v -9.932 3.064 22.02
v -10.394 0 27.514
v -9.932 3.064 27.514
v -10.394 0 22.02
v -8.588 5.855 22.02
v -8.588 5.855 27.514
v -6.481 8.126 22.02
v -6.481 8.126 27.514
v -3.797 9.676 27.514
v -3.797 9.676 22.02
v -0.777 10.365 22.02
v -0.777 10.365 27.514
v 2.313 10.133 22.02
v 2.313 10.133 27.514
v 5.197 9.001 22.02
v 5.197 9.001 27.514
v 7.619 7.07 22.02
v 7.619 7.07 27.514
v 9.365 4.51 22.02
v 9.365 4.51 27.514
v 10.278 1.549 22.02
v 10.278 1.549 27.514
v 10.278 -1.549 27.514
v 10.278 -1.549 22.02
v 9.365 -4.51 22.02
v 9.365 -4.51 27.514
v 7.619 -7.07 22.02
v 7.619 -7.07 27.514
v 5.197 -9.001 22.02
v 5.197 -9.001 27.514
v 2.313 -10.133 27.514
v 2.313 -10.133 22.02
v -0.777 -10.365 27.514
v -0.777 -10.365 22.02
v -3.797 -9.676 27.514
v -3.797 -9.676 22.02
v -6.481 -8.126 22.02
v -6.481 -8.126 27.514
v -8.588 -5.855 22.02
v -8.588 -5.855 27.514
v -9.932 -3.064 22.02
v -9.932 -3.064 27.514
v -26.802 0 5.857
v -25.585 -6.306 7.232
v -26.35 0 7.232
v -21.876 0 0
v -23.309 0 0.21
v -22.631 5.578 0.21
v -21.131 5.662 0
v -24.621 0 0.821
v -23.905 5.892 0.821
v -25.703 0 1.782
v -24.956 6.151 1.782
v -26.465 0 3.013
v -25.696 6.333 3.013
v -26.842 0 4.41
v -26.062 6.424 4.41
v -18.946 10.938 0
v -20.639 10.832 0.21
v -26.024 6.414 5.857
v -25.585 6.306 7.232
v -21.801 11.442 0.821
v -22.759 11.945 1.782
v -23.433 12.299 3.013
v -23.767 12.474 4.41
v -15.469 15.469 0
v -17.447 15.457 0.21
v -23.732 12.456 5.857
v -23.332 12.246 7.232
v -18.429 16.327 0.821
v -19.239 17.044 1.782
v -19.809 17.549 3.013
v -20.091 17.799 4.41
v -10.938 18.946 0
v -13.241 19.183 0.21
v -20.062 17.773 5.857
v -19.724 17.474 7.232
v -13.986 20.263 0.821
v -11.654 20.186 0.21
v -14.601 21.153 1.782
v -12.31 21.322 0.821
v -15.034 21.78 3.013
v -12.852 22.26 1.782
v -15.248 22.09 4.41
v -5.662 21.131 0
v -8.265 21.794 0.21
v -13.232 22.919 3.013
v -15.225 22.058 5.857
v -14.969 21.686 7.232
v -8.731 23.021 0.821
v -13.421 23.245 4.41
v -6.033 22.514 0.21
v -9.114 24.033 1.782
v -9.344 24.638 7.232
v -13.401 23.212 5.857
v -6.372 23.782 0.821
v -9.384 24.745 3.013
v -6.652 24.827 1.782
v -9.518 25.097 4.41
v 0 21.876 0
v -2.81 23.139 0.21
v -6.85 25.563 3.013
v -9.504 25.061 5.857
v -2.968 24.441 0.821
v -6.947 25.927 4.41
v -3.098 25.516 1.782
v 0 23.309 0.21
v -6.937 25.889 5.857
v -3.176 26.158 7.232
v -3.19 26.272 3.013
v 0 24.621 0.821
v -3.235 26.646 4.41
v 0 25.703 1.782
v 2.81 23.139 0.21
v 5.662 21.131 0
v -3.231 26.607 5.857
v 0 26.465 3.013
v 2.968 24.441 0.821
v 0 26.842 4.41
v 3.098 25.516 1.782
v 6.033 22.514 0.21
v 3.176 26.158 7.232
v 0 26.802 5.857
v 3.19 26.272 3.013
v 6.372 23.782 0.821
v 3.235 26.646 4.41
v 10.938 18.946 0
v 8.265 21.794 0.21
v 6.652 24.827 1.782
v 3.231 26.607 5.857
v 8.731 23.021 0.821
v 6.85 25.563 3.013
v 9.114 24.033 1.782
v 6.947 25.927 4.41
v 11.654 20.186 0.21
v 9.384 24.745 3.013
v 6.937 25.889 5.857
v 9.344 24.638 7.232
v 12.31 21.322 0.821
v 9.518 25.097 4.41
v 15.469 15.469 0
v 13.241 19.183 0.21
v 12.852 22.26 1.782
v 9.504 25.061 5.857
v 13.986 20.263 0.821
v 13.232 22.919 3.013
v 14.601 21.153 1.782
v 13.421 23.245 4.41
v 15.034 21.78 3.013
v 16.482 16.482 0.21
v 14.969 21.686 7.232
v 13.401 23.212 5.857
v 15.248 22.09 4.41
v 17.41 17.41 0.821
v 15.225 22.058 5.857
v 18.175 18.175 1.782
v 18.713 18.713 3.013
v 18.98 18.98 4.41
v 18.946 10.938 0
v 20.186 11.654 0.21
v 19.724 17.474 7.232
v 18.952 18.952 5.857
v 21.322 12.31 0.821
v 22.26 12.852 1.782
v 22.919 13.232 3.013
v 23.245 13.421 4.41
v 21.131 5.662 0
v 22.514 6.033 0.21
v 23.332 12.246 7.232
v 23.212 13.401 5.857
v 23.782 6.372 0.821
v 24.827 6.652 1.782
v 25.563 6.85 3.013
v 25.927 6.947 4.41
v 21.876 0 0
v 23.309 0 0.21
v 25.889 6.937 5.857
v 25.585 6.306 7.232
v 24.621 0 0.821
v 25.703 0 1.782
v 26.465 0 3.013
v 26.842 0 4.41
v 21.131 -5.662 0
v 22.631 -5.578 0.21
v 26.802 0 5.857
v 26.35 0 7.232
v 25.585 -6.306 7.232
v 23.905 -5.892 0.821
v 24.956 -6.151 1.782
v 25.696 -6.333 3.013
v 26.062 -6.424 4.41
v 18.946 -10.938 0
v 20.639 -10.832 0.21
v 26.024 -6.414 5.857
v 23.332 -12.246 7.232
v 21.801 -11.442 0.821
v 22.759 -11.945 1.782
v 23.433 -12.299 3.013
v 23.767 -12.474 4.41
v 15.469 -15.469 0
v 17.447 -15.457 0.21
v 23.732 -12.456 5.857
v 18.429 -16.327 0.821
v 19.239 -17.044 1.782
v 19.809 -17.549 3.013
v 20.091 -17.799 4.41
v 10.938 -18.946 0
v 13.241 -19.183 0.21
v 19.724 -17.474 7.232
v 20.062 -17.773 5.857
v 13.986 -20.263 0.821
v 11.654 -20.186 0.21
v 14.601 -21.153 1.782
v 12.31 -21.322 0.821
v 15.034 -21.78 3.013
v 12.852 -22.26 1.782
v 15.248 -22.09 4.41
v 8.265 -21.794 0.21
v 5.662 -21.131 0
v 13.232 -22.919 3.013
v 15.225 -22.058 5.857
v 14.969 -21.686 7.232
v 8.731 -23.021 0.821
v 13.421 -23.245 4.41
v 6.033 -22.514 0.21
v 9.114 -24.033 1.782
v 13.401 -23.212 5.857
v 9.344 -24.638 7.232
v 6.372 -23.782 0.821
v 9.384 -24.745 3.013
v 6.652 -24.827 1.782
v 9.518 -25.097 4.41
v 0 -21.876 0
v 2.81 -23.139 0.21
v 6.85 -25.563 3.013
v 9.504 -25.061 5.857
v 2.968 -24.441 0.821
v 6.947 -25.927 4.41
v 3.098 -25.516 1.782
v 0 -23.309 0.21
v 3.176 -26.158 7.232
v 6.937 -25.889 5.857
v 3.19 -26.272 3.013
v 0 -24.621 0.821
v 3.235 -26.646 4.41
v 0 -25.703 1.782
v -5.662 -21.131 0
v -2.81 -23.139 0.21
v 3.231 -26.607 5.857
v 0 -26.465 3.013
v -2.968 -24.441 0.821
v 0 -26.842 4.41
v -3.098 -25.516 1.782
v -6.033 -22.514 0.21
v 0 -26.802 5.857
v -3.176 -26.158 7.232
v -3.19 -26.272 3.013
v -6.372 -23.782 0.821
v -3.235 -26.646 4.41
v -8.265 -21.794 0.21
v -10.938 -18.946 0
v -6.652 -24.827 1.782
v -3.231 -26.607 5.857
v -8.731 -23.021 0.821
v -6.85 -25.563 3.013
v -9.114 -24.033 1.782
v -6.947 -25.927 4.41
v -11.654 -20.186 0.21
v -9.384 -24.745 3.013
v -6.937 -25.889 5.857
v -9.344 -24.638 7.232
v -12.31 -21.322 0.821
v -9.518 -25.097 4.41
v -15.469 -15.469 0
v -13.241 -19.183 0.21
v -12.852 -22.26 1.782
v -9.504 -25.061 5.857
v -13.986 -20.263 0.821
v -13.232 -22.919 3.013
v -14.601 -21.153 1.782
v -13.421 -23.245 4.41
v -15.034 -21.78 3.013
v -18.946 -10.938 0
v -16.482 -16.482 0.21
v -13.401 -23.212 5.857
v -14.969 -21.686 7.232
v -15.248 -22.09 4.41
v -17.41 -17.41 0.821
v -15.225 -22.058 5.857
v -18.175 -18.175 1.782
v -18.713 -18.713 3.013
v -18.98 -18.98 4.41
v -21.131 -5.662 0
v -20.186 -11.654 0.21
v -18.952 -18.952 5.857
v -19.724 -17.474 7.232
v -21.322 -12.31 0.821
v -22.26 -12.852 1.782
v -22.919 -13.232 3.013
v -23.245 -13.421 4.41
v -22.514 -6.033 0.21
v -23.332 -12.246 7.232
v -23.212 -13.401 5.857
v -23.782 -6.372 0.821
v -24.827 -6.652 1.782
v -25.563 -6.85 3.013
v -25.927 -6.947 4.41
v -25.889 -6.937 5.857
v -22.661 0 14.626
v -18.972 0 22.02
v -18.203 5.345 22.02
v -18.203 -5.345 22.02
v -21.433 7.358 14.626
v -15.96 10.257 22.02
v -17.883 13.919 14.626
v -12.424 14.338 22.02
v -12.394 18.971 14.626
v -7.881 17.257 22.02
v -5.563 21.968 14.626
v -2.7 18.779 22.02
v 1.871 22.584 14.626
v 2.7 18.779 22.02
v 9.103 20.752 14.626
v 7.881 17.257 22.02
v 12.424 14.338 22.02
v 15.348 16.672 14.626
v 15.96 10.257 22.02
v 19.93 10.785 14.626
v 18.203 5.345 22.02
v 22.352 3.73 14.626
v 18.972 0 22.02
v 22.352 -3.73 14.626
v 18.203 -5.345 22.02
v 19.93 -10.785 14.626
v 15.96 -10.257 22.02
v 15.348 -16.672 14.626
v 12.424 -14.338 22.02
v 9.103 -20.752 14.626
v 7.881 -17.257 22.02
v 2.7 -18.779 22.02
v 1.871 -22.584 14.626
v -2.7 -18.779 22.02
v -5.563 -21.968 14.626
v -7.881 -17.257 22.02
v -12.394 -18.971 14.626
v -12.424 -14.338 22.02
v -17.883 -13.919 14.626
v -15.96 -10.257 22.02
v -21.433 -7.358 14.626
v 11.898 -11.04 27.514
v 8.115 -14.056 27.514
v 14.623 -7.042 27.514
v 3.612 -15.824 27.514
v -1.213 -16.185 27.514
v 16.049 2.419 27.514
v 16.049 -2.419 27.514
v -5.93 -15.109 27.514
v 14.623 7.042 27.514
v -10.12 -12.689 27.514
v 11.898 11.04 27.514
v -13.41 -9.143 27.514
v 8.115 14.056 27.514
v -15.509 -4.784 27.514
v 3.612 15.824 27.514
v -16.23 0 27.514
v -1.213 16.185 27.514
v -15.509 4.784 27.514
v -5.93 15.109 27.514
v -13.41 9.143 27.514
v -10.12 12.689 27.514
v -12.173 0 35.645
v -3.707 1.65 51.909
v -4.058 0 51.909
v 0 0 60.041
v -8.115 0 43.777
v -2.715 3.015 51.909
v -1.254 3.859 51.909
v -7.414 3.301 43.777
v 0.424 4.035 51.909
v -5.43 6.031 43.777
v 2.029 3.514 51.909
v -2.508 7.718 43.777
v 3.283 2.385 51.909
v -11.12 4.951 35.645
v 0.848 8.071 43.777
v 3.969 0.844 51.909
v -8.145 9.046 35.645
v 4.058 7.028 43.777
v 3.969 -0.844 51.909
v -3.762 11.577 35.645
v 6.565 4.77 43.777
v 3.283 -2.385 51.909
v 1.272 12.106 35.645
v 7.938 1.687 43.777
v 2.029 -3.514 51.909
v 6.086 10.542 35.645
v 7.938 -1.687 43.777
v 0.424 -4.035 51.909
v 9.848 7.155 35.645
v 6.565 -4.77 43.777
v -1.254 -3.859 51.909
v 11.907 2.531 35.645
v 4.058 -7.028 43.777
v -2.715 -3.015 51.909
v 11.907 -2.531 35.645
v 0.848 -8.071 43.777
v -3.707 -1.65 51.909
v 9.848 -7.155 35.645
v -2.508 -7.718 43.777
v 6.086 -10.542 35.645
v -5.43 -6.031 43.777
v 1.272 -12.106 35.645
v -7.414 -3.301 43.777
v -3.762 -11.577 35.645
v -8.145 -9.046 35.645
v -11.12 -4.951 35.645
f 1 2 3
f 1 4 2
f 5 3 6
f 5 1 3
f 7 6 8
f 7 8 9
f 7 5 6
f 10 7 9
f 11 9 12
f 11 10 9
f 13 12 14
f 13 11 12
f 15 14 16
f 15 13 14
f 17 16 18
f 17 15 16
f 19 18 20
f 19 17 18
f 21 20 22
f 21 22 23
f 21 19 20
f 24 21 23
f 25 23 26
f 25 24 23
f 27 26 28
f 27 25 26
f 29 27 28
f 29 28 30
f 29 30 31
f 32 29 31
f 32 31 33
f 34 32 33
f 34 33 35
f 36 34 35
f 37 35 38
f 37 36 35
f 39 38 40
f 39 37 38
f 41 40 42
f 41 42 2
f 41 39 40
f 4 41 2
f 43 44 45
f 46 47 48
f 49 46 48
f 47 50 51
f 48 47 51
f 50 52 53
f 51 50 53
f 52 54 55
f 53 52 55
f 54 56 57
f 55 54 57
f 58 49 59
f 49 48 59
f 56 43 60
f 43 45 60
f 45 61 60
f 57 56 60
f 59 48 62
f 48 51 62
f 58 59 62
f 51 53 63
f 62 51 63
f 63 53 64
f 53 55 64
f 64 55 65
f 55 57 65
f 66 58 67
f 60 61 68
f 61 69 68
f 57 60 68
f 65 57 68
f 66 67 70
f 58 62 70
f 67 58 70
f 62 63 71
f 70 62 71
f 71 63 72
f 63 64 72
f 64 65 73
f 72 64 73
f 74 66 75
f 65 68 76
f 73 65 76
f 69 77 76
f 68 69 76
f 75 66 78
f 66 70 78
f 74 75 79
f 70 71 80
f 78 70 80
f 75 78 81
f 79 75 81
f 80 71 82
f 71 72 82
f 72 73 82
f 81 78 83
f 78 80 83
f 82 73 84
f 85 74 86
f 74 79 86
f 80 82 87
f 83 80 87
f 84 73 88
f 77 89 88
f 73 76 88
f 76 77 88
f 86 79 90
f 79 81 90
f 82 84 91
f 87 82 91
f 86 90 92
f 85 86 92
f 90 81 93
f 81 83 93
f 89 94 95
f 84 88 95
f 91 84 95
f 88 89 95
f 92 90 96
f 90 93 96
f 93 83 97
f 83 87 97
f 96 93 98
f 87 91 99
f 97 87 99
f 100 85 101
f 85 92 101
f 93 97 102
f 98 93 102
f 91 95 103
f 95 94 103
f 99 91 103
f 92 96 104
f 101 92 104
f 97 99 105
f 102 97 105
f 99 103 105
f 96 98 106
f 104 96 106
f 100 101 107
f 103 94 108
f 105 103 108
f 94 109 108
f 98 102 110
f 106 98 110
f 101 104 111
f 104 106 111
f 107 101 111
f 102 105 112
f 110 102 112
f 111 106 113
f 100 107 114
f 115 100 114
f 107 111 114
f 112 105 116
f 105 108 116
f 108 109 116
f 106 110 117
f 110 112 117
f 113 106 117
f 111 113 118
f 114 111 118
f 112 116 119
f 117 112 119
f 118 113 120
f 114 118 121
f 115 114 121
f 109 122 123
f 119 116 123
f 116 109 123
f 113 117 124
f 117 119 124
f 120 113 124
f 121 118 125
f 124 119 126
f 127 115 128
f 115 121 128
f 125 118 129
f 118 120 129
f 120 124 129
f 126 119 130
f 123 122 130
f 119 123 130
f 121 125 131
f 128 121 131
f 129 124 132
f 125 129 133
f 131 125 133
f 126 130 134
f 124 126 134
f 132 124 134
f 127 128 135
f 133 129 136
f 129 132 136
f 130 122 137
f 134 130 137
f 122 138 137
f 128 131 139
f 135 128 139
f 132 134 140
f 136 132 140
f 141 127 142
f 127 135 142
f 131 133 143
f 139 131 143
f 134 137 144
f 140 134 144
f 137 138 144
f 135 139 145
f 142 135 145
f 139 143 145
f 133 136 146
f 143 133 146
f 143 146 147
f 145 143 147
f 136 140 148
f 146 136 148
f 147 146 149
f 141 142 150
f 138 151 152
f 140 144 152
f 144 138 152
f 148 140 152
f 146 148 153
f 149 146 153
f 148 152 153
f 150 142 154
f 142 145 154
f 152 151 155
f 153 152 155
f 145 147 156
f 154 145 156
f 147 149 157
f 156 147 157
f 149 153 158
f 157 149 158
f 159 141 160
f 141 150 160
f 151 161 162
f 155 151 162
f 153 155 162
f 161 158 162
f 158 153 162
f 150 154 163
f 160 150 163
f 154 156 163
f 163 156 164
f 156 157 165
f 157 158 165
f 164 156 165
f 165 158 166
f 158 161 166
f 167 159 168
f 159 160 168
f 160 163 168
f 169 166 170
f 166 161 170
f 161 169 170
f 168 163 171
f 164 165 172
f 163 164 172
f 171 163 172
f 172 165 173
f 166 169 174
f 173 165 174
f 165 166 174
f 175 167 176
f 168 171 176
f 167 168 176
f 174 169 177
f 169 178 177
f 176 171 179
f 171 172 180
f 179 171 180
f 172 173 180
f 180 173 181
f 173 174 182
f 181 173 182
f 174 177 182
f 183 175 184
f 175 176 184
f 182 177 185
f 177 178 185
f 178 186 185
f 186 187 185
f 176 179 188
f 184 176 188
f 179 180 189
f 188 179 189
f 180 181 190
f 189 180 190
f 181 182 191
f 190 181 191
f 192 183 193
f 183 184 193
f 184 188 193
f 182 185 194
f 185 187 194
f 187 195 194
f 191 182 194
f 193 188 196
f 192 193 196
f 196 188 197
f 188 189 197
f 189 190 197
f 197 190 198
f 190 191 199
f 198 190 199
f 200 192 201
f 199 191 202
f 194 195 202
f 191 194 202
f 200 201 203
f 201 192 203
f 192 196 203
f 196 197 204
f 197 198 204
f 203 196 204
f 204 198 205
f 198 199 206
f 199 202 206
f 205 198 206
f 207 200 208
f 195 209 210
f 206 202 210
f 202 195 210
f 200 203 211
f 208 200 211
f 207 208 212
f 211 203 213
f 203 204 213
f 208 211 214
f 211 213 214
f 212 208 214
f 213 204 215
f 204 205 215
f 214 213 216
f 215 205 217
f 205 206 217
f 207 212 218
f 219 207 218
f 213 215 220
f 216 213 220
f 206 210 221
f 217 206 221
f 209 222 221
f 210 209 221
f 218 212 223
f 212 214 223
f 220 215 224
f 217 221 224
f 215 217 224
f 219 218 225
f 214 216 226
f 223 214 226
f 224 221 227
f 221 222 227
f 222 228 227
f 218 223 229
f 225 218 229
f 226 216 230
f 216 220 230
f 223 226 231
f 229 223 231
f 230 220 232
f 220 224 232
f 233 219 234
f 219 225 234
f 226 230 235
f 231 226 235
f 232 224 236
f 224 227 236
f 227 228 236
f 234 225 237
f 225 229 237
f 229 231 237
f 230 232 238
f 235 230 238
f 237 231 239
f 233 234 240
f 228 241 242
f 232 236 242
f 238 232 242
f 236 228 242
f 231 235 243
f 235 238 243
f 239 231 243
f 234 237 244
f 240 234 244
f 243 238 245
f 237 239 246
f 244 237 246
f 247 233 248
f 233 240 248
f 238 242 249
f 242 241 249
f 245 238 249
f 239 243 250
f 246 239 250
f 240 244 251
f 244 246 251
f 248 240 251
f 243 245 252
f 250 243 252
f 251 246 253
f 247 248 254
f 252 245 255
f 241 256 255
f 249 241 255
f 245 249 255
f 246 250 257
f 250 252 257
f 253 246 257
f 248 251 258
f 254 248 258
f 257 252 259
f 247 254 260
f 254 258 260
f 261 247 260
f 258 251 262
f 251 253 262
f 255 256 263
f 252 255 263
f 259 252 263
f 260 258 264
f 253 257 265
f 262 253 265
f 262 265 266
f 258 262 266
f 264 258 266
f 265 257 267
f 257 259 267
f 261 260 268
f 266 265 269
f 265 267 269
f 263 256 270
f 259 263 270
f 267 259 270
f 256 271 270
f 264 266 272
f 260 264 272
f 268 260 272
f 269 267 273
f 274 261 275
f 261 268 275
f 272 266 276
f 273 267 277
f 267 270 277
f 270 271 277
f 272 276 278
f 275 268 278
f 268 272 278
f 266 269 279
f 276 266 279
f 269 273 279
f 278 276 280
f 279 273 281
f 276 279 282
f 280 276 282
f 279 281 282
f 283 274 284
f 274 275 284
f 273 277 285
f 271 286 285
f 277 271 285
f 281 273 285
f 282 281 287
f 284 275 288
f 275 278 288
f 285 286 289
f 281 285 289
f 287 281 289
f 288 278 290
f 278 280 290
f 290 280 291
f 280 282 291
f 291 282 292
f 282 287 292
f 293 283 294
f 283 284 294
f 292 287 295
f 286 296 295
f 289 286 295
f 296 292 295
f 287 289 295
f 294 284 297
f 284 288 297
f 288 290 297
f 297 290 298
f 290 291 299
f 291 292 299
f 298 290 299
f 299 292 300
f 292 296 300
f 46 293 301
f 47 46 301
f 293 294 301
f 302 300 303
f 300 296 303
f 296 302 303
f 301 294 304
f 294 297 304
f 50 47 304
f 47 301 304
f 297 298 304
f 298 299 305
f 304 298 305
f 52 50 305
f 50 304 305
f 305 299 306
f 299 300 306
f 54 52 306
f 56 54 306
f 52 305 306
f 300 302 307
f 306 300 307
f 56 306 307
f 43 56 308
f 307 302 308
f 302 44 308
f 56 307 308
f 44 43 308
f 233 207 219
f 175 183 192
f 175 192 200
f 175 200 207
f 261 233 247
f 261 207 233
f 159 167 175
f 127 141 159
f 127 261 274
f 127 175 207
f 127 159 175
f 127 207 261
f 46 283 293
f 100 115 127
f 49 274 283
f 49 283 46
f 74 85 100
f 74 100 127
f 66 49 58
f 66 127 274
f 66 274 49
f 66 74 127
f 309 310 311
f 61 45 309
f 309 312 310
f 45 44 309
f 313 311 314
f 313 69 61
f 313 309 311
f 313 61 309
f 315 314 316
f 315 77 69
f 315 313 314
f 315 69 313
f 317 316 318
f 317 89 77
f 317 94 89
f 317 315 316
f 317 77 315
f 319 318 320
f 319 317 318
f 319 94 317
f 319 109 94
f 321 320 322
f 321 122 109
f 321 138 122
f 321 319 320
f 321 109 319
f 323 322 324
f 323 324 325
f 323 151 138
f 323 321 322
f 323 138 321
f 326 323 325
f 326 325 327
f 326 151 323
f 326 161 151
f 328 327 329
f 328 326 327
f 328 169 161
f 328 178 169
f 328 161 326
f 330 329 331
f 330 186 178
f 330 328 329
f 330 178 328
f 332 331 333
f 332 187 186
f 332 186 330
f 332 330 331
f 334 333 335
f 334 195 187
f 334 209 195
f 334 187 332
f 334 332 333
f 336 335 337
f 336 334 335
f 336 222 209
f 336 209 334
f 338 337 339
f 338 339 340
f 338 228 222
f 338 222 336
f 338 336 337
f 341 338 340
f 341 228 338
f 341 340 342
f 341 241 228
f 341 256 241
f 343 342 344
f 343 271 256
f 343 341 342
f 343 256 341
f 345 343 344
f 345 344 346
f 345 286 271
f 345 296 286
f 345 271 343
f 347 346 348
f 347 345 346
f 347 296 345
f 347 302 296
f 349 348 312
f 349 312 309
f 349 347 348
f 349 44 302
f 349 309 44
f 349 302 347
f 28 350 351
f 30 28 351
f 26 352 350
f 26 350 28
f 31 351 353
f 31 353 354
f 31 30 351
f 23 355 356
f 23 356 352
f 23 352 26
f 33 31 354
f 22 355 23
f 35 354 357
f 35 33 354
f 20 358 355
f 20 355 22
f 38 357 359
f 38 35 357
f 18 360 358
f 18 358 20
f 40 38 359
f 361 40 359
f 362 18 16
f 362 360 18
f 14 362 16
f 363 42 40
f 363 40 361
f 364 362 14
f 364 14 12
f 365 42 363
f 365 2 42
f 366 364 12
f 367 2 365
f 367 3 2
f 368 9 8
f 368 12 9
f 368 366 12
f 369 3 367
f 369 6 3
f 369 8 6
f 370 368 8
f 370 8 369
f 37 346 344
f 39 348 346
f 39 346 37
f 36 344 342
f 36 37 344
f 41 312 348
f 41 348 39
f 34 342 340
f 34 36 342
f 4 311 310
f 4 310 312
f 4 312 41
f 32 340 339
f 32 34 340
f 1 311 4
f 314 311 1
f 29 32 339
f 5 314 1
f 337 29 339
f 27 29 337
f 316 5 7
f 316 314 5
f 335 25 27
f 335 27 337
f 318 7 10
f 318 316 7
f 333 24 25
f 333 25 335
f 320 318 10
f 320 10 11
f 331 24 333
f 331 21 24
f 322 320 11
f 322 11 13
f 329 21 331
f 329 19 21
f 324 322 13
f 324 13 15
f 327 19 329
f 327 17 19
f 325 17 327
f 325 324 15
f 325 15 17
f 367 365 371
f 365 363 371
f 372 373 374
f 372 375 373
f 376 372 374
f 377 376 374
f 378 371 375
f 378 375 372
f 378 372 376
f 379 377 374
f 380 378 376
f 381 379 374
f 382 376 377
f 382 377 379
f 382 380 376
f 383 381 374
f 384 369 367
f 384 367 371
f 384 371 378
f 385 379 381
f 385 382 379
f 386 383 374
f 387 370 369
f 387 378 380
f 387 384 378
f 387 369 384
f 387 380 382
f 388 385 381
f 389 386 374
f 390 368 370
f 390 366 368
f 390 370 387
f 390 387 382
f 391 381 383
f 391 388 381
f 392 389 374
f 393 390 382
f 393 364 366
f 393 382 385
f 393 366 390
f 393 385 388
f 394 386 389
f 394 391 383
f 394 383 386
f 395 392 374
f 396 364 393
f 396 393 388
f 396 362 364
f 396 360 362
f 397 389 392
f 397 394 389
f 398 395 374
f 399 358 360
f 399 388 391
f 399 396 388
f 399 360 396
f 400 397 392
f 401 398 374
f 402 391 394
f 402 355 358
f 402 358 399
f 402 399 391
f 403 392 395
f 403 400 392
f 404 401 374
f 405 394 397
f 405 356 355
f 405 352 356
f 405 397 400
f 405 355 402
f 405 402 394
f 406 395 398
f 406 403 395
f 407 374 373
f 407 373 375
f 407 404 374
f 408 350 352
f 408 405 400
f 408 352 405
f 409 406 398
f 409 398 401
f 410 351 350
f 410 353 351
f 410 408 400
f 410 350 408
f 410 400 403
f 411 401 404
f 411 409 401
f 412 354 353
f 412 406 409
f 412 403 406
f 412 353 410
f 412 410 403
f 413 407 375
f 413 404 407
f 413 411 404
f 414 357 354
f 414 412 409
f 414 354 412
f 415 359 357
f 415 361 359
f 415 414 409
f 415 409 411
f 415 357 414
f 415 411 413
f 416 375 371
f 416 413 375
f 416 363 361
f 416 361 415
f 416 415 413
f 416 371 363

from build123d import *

# Parameters (mm, degrees)
F3_R = 5


with BuildPart() as f2:
    # F0 (on Front) → F2 (revolve)
    with BuildSketch(Plane.XZ):
        Polygon((-29.959241, 0), (0, 0), (0, 60.040765), (-16.230465, 27.513588), (-10.394023, 27.513588), (-10.394023, 22.020024), (-18.971652, 22.020024), align=None)
    revolve(axis=Axis((0, 0, 23.967392), (0, 0, -1)))

    # F3
    f3_edges = [f2.edges().sort_by_distance(p)[0] for p in [
        (29.959241, 0, 0),
    ]]
    fillet(f3_edges, radius=F3_R)


solid = f2.part
